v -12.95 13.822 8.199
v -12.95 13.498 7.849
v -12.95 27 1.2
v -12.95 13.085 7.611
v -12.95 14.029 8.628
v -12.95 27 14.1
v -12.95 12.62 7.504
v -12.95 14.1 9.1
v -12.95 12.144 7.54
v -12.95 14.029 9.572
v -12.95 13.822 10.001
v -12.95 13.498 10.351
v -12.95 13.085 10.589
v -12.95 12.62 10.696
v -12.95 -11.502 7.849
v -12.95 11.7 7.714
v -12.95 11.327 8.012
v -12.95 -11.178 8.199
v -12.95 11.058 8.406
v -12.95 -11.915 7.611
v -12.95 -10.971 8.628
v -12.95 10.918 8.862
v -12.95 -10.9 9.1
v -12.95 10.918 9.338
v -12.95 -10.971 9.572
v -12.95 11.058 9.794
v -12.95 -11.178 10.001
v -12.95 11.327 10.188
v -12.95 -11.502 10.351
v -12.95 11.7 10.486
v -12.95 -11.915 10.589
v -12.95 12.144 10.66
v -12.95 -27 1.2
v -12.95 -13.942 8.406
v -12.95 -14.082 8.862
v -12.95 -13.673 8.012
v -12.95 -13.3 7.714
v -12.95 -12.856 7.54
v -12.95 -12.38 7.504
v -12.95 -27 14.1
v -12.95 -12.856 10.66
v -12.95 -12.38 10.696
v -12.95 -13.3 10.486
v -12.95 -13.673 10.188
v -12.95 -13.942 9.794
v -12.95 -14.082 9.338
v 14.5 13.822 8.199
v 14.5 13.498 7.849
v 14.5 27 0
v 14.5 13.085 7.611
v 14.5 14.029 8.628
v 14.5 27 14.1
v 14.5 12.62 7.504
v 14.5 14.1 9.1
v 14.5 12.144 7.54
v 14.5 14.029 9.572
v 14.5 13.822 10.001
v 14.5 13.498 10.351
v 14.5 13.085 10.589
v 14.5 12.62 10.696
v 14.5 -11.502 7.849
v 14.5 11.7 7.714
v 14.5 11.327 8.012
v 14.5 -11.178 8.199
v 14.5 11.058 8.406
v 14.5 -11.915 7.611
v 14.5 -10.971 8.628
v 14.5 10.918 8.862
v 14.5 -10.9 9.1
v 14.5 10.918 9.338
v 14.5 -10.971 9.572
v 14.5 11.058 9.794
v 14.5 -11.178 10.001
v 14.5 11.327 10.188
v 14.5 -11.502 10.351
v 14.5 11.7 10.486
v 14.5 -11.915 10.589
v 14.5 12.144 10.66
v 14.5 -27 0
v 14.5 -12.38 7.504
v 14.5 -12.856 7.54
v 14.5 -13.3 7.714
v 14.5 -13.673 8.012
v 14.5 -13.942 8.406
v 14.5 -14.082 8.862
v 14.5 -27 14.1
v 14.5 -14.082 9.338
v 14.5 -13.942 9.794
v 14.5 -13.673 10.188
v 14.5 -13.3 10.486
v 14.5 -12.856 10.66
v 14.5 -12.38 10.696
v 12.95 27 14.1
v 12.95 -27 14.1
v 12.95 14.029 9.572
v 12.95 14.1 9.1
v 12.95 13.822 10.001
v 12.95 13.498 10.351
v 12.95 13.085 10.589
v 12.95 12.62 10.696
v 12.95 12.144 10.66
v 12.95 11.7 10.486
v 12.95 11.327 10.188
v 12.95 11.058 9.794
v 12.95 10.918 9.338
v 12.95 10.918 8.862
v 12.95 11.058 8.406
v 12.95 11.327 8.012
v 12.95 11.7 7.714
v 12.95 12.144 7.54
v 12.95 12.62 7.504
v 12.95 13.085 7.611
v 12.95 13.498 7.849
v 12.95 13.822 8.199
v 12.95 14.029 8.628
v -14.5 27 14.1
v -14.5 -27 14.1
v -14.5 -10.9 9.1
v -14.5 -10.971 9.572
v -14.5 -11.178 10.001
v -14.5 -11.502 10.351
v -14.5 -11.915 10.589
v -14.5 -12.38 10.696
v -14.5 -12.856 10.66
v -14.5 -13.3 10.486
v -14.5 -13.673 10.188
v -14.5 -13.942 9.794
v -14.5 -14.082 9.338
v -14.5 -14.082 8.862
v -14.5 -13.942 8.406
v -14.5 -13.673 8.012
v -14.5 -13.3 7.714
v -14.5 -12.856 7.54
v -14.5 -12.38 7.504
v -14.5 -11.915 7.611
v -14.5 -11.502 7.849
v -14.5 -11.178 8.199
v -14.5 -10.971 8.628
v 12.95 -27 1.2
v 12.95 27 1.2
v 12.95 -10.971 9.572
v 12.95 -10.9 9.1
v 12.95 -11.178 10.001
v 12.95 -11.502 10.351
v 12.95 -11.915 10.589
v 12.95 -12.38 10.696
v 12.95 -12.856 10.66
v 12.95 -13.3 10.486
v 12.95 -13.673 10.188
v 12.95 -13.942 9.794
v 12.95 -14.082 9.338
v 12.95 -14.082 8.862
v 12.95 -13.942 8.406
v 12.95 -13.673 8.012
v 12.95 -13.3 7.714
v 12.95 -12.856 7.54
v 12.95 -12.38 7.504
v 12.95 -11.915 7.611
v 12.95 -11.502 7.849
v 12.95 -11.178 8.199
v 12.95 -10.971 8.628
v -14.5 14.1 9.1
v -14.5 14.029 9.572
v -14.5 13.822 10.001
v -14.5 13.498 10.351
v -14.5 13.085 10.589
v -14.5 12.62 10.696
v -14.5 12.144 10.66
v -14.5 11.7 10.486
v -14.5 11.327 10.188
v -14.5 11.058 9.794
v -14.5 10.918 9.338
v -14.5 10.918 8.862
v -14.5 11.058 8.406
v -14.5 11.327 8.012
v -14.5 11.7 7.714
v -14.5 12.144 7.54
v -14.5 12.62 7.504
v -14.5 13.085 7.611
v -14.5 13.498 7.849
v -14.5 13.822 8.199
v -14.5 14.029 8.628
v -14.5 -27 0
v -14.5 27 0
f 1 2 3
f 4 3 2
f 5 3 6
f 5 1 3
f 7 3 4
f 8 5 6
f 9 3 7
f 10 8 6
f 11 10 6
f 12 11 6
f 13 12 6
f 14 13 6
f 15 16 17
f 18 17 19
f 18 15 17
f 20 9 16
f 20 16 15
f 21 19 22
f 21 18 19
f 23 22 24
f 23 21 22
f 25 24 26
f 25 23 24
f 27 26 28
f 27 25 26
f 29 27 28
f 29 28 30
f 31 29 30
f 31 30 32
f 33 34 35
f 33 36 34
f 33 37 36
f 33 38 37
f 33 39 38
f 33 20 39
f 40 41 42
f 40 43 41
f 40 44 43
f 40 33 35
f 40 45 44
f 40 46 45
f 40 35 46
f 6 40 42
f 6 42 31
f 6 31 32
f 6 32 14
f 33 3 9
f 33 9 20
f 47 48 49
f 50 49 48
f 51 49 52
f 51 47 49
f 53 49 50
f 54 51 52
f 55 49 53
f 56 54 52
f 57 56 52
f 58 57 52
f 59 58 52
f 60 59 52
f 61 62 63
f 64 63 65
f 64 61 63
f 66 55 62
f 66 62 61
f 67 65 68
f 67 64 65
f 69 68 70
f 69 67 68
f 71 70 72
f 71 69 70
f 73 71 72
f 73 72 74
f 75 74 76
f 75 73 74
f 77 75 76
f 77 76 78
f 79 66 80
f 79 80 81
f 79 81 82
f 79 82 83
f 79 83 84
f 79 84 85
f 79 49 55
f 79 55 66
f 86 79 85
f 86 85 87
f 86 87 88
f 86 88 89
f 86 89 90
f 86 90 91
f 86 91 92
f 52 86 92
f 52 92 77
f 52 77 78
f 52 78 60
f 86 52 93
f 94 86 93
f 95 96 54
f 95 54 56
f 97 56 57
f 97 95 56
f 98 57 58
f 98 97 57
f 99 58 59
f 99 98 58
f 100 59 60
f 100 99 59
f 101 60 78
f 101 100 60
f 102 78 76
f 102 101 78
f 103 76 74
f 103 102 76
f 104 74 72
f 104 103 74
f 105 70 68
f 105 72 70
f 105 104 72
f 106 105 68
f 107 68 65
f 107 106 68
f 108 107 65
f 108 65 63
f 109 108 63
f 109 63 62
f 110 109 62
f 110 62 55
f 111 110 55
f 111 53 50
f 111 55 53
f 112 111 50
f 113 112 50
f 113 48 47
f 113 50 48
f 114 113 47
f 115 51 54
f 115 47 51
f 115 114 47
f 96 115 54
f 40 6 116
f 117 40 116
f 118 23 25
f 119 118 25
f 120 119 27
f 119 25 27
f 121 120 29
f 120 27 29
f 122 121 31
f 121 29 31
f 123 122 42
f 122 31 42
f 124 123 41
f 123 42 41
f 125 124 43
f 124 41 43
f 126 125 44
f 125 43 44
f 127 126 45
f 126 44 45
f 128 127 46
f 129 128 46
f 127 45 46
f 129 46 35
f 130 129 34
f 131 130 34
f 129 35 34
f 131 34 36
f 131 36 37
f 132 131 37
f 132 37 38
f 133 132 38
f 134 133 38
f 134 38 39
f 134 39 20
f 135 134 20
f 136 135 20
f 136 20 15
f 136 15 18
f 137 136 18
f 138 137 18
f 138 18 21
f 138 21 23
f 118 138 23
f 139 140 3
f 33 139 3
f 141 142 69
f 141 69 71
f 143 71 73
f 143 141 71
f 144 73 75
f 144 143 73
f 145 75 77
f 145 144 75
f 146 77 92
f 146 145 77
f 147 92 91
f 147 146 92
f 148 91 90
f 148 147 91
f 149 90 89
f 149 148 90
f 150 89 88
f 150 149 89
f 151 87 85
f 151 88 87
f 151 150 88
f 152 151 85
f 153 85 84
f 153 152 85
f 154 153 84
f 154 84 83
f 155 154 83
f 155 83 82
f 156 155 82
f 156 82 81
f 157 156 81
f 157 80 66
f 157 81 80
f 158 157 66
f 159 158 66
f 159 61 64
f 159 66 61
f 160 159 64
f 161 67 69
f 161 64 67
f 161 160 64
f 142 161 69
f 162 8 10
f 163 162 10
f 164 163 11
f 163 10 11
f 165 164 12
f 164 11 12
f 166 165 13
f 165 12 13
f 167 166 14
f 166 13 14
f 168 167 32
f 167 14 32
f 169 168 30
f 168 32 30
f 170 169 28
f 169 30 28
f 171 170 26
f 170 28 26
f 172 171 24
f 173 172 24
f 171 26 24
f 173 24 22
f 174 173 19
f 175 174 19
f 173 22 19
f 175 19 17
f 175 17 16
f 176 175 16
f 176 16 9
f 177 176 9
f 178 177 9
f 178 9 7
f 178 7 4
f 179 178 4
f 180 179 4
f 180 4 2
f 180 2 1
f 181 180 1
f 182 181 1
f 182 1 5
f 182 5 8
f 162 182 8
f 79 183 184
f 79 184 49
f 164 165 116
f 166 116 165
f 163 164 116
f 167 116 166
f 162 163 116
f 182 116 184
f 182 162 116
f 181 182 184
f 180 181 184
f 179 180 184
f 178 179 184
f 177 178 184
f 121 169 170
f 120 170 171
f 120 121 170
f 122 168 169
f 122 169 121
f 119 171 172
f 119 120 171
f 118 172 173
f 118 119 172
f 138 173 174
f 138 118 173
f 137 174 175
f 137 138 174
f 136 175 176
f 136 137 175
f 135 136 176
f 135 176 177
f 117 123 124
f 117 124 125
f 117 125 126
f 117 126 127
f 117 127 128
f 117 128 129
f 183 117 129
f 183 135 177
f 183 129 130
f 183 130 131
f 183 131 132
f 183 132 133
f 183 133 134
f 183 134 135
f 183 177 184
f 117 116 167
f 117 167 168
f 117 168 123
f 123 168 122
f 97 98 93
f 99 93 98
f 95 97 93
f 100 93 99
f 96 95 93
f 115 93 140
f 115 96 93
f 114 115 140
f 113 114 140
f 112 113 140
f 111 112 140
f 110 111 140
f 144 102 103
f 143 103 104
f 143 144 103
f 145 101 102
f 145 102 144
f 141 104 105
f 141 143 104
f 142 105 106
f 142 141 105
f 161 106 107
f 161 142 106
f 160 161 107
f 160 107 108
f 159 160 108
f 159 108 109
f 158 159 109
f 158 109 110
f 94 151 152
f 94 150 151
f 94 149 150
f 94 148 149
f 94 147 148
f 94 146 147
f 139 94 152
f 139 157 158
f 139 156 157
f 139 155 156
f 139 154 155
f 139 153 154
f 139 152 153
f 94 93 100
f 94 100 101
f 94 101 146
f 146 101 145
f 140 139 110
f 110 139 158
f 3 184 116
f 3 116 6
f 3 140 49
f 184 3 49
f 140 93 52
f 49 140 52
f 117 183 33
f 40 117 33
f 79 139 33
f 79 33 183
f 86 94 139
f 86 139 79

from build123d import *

# Parameters (mm, degrees)
PAD_DEPTH         = 27
SKETCH001_R       = 1.6
POCKET_DEPTH      = 14.501
POCKET_DEPTH_BACK = -14.501


with BuildPart() as part:
    # Sketch → Pad (new body, symmetric)
    with BuildSketch(Plane.XZ):
        Polygon((-14.5, 14.1), (-14.5, 0), (14.5, 0), (14.5, 14.1), (12.95, 14.1), (12.95, 1.2), (-12.95, 1.2), (-12.95, 14.1), align=None)
    extrude(amount=PAD_DEPTH, both=True)

    # Sketch001 → Pocket (cut, two sides)
    with BuildSketch(Plane.YZ) as pocket_sk:
        with Locations((-12.5, 9.1)):
            Circle(SKETCH001_R)
        with Locations((12.5, 9.1)):
            Circle(SKETCH001_R)
    extrude(amount=-POCKET_DEPTH, mode=Mode.SUBTRACT)
    extrude(pocket_sk.sketch, amount=-POCKET_DEPTH_BACK, mode=Mode.SUBTRACT)


solid = part.part
